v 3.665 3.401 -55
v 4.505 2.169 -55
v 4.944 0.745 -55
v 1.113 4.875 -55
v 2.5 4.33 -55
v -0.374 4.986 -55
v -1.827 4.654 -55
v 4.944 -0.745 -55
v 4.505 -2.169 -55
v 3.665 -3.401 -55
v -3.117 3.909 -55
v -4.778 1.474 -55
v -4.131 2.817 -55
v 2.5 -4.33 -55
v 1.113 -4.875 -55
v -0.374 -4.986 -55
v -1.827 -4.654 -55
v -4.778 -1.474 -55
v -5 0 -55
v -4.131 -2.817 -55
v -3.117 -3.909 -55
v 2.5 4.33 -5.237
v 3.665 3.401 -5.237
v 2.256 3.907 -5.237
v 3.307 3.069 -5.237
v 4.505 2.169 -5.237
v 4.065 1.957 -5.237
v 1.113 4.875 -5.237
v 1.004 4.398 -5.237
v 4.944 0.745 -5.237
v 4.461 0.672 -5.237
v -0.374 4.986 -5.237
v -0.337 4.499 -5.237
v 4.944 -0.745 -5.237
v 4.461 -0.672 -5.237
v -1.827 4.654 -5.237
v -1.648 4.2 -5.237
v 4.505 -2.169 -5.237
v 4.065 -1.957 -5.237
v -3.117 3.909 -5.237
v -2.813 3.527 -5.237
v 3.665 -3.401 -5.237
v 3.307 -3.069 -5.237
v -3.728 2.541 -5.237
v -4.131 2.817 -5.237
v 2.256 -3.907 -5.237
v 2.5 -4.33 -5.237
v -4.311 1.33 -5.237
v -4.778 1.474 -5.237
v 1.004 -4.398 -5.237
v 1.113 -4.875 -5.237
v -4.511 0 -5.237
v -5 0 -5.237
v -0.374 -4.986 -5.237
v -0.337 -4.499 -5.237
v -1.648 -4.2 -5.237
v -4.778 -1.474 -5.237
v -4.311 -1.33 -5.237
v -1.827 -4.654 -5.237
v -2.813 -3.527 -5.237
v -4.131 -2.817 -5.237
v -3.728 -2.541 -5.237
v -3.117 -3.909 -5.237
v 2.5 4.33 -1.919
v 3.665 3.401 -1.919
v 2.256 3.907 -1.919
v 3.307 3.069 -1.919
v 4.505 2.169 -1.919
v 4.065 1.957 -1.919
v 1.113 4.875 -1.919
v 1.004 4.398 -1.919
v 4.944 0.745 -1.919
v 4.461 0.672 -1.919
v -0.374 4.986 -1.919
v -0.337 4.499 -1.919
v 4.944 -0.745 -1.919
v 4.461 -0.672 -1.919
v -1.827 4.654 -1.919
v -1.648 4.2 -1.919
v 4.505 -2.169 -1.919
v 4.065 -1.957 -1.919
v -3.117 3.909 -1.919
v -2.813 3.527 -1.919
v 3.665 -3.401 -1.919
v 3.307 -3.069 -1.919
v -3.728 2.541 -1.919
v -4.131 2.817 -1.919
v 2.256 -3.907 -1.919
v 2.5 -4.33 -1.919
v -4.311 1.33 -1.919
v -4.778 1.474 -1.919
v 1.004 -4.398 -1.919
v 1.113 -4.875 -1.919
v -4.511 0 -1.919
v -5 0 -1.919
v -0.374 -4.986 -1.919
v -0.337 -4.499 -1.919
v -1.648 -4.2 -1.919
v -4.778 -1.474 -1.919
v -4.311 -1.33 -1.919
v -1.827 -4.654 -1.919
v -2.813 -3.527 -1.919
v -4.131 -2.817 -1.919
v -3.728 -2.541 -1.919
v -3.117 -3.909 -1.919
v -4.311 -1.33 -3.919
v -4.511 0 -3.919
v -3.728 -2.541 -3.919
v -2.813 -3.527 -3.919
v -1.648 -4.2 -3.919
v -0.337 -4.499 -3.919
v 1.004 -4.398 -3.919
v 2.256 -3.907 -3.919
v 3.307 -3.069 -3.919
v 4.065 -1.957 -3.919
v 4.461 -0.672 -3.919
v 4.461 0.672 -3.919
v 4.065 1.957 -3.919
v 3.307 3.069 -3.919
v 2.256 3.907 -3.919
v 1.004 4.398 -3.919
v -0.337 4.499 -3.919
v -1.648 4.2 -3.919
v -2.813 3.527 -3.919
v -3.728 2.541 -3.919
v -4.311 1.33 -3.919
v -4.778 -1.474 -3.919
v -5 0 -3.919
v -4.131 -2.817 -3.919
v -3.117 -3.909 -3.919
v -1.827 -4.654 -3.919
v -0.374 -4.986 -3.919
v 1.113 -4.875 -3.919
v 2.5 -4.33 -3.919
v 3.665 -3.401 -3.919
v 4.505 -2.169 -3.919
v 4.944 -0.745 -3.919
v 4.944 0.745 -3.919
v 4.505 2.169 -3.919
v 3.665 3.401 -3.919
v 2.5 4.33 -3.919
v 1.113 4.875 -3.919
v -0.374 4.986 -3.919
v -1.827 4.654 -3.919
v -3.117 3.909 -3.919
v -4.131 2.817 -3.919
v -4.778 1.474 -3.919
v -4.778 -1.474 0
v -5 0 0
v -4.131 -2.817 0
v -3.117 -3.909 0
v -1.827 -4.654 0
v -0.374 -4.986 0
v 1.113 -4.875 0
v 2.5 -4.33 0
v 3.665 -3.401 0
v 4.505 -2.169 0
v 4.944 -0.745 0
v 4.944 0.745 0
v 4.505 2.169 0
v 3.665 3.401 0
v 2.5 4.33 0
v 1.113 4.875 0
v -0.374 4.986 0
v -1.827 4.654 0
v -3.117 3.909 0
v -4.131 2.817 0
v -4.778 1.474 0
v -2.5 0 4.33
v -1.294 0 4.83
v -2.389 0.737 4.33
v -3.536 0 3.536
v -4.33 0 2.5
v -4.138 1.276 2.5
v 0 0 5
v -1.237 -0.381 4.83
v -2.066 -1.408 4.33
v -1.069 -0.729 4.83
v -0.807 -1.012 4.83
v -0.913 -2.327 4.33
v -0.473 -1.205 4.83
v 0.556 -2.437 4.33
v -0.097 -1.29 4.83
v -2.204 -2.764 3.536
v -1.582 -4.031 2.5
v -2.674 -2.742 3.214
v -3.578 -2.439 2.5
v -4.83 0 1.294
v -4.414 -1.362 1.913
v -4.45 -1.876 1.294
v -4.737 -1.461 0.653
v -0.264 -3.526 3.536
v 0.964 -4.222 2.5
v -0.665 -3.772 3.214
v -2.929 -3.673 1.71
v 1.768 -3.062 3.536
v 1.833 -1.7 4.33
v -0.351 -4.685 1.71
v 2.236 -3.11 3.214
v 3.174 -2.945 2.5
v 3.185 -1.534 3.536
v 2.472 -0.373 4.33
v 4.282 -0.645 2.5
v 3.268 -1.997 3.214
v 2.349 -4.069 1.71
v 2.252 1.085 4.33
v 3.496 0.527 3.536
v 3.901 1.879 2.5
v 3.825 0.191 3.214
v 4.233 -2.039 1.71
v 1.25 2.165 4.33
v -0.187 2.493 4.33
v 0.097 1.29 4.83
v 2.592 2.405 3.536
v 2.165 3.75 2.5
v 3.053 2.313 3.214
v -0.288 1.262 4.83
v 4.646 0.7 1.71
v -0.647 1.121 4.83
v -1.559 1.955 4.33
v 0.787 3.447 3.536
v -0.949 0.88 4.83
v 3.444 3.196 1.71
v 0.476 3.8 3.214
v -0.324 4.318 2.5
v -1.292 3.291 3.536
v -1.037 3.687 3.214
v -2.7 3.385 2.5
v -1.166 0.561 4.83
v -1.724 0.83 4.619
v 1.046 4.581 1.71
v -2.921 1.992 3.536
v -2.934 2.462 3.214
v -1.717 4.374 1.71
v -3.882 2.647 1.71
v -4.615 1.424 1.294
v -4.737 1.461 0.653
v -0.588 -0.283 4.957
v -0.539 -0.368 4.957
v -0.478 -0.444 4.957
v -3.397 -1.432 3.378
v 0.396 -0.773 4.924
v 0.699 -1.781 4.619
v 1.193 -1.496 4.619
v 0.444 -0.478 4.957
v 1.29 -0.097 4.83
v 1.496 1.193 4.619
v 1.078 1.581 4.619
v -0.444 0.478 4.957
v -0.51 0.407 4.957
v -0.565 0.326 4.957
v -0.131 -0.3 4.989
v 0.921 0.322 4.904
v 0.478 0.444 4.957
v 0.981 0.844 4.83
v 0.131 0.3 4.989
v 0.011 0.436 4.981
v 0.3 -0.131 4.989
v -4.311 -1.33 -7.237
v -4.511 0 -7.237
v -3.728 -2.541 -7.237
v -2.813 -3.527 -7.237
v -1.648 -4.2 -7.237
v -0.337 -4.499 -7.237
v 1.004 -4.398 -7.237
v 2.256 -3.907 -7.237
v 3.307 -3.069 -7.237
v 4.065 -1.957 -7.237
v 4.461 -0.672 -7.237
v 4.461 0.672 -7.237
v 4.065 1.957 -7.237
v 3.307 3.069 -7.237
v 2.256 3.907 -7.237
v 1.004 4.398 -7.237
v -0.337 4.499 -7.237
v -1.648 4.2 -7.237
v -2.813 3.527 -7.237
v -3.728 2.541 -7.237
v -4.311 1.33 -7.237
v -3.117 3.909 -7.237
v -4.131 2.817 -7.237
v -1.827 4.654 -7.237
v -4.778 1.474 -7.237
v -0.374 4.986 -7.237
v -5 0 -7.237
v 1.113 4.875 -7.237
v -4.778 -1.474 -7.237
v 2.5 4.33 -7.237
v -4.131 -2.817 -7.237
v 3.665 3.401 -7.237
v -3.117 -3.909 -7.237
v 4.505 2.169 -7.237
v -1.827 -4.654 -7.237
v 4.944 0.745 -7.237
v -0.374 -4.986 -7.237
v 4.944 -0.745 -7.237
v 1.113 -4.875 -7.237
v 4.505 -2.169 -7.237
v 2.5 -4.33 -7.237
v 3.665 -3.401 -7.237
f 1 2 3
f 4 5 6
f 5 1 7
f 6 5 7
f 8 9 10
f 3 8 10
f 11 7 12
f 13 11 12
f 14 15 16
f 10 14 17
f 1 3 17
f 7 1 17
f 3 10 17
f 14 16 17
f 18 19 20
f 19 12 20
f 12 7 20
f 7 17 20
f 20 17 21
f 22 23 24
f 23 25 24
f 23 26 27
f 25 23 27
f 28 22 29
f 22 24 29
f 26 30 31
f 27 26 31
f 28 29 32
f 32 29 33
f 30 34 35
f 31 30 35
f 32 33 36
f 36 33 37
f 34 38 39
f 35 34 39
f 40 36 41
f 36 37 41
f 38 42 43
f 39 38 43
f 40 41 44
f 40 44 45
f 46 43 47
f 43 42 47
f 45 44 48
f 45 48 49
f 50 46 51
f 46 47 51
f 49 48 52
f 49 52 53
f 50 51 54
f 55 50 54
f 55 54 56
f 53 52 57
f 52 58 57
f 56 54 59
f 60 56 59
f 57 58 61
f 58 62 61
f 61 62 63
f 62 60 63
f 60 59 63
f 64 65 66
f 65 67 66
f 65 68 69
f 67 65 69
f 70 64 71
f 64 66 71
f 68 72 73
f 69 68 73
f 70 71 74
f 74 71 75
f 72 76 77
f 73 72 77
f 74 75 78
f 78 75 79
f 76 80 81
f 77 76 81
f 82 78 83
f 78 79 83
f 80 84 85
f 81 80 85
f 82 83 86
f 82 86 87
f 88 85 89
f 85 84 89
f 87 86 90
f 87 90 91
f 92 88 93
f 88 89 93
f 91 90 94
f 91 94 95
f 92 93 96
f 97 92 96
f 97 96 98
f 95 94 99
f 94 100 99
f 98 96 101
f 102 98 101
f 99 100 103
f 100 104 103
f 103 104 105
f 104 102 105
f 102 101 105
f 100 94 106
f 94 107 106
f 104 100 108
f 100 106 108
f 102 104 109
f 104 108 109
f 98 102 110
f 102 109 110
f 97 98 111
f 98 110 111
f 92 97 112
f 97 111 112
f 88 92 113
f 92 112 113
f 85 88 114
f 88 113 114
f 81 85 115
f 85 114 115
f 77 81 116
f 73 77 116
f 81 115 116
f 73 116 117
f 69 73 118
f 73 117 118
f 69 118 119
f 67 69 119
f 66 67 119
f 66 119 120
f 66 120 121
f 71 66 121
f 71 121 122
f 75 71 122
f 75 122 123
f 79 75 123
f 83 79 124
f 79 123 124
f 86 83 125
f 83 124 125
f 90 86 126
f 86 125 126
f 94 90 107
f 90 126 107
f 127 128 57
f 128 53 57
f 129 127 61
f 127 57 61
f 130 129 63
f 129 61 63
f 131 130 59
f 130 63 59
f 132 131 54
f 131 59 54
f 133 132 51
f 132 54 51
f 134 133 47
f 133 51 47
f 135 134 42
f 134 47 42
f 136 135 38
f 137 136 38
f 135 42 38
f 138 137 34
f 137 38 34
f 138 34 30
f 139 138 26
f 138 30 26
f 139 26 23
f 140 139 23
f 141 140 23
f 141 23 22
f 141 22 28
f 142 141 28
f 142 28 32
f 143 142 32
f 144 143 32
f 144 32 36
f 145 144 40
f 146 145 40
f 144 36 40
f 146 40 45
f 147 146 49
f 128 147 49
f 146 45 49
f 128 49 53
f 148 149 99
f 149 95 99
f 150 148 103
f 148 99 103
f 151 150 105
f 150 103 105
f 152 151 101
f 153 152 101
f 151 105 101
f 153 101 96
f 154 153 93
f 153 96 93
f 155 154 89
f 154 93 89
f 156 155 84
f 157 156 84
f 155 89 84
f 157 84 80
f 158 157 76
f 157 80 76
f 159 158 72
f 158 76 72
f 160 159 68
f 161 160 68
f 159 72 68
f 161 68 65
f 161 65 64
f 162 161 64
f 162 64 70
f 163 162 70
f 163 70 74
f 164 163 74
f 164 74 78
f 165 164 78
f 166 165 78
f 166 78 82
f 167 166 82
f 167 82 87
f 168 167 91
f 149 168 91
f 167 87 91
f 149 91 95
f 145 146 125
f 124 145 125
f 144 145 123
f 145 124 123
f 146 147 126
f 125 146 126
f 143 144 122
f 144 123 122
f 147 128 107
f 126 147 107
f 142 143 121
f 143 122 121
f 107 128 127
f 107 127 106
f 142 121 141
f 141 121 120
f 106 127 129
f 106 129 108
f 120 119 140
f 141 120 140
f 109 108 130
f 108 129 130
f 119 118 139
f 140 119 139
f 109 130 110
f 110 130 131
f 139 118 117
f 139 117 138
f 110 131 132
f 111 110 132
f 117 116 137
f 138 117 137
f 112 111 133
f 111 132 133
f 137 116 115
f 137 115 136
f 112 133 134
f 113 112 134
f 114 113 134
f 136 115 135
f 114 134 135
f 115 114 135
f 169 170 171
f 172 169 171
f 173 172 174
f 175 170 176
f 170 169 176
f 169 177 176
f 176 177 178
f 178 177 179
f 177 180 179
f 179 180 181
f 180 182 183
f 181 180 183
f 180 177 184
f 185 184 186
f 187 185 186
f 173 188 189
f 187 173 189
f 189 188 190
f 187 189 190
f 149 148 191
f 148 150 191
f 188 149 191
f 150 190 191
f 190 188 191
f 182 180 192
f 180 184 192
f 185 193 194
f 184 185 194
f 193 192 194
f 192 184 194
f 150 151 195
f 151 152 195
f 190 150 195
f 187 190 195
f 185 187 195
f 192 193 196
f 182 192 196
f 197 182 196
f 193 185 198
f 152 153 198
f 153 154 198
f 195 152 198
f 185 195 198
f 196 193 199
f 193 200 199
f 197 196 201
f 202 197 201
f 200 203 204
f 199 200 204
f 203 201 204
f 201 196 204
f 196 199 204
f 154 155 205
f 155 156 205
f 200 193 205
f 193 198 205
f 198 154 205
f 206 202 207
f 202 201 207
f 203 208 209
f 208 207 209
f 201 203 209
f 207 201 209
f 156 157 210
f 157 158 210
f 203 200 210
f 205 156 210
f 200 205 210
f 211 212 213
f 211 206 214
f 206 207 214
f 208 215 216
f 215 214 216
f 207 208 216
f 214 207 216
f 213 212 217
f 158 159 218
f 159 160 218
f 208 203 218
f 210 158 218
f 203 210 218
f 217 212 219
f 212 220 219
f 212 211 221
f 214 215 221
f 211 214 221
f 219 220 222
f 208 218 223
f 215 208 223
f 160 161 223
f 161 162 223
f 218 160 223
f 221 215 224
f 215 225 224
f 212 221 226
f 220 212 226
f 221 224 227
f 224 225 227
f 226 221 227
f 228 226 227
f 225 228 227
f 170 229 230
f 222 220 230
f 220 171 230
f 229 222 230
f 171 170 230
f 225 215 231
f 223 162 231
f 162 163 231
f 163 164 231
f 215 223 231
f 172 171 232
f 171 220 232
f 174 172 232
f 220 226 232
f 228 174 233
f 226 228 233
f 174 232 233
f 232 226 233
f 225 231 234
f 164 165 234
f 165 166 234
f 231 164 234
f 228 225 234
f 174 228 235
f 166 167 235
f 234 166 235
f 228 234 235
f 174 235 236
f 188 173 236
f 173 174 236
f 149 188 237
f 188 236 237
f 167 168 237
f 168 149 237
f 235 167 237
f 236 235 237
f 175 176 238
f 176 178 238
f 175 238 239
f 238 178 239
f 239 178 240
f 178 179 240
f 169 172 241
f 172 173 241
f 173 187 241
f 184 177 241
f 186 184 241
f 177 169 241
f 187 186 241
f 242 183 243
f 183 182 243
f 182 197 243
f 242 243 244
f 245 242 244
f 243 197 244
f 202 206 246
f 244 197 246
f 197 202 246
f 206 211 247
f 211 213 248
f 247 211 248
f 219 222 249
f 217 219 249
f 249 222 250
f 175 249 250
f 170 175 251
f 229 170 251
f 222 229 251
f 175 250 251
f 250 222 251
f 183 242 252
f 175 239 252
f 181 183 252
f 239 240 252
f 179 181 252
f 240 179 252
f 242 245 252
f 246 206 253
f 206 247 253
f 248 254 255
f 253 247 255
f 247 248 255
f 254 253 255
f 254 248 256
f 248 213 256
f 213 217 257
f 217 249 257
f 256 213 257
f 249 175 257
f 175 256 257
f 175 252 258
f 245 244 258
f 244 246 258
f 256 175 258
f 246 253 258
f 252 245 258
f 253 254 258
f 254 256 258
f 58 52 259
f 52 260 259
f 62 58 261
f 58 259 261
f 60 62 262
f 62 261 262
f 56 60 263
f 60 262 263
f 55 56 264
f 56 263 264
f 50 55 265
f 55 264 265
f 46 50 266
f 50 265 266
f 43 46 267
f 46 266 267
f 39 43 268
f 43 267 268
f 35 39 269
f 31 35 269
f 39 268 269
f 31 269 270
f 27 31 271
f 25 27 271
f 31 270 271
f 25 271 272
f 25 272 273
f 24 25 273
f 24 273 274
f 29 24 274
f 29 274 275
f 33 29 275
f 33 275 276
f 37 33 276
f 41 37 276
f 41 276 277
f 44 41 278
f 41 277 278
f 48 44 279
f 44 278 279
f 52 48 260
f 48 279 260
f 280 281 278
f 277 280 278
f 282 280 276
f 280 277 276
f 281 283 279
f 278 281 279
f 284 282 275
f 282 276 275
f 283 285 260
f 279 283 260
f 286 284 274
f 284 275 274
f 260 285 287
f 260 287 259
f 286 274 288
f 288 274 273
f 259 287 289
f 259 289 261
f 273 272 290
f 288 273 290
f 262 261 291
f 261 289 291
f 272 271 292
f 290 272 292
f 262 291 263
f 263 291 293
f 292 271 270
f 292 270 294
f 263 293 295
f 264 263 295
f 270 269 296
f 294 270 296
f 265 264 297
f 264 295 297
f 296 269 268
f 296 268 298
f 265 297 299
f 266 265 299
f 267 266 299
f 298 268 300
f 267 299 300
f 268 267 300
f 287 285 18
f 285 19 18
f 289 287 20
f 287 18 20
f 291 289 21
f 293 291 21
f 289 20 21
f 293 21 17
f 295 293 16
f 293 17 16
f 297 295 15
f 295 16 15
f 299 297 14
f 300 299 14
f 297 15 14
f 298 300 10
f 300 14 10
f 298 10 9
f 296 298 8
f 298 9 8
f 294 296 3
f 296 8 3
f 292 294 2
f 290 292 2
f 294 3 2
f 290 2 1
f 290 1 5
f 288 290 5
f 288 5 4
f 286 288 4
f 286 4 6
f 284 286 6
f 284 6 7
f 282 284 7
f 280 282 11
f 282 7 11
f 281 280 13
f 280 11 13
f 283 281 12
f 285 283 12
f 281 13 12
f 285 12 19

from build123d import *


with BuildPart() as f1:
    # F0 (on Front) → F1 (revolve)
    with BuildSketch(Plane.XZ):
        with BuildLine():
            Line((0, -55), (0, 5))
            ThreePointArc((0, 5), (-3.535534, 3.535534), (-5, 0))
            Line((-5, 0), (-5, -1.918864))
            Line((-5, -1.918864), (-4.511429, -1.918864))
            Line((-4.511429, -1.918864), (-4.511429, -3.918864))
            Line((-4.511429, -3.918864), (-5, -3.918864))
            Line((-5, -3.918864), (-5, -5.237238))
            Line((-5, -5.237238), (-4.511429, -5.237238))
            Line((-4.511429, -5.237238), (-4.511429, -7.237238))
            Line((-4.511429, -7.237238), (-5, -7.237238))
            Line((-5, -7.237238), (-5, -55))
            Line((-5, -55), (0, -55))
        make_face()
    revolve(axis=Axis((0, 0, -25), (0, 0, 1)))


solid = f1.part
